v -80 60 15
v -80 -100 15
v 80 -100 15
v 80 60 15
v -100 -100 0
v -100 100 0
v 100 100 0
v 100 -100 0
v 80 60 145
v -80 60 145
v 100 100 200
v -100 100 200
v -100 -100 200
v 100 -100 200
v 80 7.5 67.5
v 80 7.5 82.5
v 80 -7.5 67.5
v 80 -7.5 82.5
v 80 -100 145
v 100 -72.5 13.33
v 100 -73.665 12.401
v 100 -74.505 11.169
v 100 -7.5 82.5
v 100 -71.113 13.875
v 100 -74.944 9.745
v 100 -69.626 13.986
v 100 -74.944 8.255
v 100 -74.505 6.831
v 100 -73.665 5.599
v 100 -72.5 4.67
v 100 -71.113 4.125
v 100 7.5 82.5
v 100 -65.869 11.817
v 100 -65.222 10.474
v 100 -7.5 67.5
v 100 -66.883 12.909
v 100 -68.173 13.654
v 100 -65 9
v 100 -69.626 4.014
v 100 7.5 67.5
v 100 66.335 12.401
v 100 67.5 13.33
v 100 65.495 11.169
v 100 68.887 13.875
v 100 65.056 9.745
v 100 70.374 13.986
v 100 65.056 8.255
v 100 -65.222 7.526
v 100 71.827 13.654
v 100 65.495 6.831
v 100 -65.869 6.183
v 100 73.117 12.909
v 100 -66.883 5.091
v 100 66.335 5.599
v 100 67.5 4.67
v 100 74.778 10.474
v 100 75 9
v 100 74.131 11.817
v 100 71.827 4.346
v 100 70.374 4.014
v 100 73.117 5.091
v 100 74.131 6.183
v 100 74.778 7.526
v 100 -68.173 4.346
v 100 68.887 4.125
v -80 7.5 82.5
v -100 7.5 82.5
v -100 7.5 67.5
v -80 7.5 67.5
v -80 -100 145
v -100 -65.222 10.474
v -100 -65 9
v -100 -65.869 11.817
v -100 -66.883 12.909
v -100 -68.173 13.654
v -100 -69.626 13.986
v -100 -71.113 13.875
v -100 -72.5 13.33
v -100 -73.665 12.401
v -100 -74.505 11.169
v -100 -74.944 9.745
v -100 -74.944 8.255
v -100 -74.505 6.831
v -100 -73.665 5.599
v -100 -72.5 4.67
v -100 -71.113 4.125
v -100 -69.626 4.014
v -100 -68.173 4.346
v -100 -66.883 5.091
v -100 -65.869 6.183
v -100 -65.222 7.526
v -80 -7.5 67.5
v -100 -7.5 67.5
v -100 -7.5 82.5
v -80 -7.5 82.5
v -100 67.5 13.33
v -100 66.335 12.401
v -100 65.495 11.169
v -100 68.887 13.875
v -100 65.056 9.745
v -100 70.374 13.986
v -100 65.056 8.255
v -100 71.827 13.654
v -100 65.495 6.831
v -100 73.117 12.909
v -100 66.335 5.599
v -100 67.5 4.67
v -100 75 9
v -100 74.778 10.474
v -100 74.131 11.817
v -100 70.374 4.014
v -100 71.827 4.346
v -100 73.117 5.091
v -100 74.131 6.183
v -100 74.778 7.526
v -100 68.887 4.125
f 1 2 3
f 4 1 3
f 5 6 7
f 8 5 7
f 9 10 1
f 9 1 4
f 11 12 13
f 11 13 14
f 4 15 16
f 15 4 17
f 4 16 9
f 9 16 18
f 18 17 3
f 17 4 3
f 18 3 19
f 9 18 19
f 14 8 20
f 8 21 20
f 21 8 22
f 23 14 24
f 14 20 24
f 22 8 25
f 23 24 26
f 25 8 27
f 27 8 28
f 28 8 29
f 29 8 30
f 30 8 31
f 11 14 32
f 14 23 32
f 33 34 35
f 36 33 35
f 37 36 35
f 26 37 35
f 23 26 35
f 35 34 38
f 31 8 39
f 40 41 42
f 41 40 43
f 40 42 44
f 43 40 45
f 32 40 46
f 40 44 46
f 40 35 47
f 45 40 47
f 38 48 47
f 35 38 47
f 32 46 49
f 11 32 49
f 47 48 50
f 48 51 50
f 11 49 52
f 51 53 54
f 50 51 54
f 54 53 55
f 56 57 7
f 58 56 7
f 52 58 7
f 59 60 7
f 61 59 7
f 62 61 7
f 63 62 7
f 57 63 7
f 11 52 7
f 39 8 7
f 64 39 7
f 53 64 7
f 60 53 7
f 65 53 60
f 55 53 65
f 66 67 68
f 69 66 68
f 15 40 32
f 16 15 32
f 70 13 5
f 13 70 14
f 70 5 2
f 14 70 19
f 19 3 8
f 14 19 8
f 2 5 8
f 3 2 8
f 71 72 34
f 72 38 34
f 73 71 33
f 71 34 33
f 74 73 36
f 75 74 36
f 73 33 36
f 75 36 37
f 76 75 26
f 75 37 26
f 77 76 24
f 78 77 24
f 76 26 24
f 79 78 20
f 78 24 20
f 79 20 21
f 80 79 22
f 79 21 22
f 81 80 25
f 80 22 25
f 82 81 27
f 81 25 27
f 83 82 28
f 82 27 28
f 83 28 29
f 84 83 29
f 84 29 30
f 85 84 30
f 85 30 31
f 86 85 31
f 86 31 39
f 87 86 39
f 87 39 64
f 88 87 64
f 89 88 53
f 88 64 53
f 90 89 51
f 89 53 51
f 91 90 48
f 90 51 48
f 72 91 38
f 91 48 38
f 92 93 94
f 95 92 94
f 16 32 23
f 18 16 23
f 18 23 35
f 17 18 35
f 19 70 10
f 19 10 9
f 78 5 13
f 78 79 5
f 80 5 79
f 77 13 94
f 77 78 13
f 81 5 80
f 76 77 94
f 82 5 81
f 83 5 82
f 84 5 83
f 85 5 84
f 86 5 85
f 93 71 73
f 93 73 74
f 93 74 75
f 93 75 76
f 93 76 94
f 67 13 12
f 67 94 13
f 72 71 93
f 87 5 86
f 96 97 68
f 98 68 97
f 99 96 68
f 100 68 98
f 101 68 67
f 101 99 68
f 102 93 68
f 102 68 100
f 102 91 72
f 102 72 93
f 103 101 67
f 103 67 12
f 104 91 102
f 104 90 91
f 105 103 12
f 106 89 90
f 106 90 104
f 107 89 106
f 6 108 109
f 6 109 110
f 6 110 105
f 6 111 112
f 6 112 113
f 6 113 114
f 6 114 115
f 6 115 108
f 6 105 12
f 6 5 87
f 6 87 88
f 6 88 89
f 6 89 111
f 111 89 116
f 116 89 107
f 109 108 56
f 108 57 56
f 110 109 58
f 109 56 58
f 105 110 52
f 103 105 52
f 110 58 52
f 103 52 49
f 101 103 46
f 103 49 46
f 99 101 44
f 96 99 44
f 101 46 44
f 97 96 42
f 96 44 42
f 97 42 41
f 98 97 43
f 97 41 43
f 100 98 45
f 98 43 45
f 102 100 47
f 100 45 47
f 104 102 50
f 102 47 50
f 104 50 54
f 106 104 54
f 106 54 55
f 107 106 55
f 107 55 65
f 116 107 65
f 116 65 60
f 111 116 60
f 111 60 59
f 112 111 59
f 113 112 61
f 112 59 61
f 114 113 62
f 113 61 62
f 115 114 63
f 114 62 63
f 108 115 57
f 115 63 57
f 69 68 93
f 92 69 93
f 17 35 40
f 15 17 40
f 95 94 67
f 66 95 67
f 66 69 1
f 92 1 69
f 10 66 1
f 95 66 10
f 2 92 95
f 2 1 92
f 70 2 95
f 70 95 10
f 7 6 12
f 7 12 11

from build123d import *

# Parameters (mm, degrees)
F0_W           = 200
F0_H           = 200
F1_DEPTH       = 200
F2_W           = 160
F2_H           = 130
F3_DEPTH       = 160
F5_DEPTH       = 24
F7_R           = 5
F8_DEPTH       = 25
F9_DEPTH       = 25
F9_DEPTH_BACK  = 203.2
F10_DEPTH      = 25
F10_DEPTH_BACK = 215.8


with BuildPart() as f1:
    # F0 (on Top) → F1 (new body)
    with BuildSketch(Plane.XY):
        Rectangle(F0_W, F0_H)
    extrude(amount=F1_DEPTH)

    # F2 (on face) → F3 (cut)
    with BuildSketch(Plane.XZ.offset(100)):
        with Locations((0, 80)):
            Rectangle(F2_W, F2_H)
    extrude(amount=-F3_DEPTH, mode=Mode.SUBTRACT)

    # F4 (on face) → F5 (cut)
    with BuildSketch(Plane.YZ.offset(100)):
        Polygon((-7.5, 67.5), (0, 67.5), (7.5, 67.5), (7.5, 82.5), (-7.5, 82.5), align=None)
    extrude(amount=-F5_DEPTH, mode=Mode.SUBTRACT)

    # F6 (on face) + F7 (on face) → F8 (cut)
    with BuildSketch(Plane(origin=(-100, 0, 0), x_dir=(0, -1, 0), z_dir=(-1, 0, 0))):
        Polygon((-7.5, 67.5), (0, 67.5), (7.5, 67.5), (7.5, 82.5), (-7.5, 82.5), align=None)
    with BuildSketch(Plane.YZ.offset(100)):
        with Locations((70, 9)):
            Circle(F7_R)
        with Locations((-70, 9)):
            Circle(F7_R)
    extrude(amount=-F8_DEPTH, mode=Mode.SUBTRACT)

    # F7 (on face) → F9 (cut, two sides)
    with BuildSketch(Plane.YZ.offset(100)) as f9_sk:
        with Locations((-70, 9)):
            Circle(F7_R)
    extrude(amount=F9_DEPTH, mode=Mode.SUBTRACT)
    extrude(f9_sk.sketch, amount=-F9_DEPTH_BACK, mode=Mode.SUBTRACT)

    # F7 (on face) → F10 (cut, two sides)
    with BuildSketch(Plane.YZ.offset(100)) as f10_sk:
        with Locations((70, 9)):
            Circle(F7_R)
    extrude(amount=F10_DEPTH, mode=Mode.SUBTRACT)
    extrude(f10_sk.sketch, amount=-F10_DEPTH_BACK, mode=Mode.SUBTRACT)


solid = f1.part
